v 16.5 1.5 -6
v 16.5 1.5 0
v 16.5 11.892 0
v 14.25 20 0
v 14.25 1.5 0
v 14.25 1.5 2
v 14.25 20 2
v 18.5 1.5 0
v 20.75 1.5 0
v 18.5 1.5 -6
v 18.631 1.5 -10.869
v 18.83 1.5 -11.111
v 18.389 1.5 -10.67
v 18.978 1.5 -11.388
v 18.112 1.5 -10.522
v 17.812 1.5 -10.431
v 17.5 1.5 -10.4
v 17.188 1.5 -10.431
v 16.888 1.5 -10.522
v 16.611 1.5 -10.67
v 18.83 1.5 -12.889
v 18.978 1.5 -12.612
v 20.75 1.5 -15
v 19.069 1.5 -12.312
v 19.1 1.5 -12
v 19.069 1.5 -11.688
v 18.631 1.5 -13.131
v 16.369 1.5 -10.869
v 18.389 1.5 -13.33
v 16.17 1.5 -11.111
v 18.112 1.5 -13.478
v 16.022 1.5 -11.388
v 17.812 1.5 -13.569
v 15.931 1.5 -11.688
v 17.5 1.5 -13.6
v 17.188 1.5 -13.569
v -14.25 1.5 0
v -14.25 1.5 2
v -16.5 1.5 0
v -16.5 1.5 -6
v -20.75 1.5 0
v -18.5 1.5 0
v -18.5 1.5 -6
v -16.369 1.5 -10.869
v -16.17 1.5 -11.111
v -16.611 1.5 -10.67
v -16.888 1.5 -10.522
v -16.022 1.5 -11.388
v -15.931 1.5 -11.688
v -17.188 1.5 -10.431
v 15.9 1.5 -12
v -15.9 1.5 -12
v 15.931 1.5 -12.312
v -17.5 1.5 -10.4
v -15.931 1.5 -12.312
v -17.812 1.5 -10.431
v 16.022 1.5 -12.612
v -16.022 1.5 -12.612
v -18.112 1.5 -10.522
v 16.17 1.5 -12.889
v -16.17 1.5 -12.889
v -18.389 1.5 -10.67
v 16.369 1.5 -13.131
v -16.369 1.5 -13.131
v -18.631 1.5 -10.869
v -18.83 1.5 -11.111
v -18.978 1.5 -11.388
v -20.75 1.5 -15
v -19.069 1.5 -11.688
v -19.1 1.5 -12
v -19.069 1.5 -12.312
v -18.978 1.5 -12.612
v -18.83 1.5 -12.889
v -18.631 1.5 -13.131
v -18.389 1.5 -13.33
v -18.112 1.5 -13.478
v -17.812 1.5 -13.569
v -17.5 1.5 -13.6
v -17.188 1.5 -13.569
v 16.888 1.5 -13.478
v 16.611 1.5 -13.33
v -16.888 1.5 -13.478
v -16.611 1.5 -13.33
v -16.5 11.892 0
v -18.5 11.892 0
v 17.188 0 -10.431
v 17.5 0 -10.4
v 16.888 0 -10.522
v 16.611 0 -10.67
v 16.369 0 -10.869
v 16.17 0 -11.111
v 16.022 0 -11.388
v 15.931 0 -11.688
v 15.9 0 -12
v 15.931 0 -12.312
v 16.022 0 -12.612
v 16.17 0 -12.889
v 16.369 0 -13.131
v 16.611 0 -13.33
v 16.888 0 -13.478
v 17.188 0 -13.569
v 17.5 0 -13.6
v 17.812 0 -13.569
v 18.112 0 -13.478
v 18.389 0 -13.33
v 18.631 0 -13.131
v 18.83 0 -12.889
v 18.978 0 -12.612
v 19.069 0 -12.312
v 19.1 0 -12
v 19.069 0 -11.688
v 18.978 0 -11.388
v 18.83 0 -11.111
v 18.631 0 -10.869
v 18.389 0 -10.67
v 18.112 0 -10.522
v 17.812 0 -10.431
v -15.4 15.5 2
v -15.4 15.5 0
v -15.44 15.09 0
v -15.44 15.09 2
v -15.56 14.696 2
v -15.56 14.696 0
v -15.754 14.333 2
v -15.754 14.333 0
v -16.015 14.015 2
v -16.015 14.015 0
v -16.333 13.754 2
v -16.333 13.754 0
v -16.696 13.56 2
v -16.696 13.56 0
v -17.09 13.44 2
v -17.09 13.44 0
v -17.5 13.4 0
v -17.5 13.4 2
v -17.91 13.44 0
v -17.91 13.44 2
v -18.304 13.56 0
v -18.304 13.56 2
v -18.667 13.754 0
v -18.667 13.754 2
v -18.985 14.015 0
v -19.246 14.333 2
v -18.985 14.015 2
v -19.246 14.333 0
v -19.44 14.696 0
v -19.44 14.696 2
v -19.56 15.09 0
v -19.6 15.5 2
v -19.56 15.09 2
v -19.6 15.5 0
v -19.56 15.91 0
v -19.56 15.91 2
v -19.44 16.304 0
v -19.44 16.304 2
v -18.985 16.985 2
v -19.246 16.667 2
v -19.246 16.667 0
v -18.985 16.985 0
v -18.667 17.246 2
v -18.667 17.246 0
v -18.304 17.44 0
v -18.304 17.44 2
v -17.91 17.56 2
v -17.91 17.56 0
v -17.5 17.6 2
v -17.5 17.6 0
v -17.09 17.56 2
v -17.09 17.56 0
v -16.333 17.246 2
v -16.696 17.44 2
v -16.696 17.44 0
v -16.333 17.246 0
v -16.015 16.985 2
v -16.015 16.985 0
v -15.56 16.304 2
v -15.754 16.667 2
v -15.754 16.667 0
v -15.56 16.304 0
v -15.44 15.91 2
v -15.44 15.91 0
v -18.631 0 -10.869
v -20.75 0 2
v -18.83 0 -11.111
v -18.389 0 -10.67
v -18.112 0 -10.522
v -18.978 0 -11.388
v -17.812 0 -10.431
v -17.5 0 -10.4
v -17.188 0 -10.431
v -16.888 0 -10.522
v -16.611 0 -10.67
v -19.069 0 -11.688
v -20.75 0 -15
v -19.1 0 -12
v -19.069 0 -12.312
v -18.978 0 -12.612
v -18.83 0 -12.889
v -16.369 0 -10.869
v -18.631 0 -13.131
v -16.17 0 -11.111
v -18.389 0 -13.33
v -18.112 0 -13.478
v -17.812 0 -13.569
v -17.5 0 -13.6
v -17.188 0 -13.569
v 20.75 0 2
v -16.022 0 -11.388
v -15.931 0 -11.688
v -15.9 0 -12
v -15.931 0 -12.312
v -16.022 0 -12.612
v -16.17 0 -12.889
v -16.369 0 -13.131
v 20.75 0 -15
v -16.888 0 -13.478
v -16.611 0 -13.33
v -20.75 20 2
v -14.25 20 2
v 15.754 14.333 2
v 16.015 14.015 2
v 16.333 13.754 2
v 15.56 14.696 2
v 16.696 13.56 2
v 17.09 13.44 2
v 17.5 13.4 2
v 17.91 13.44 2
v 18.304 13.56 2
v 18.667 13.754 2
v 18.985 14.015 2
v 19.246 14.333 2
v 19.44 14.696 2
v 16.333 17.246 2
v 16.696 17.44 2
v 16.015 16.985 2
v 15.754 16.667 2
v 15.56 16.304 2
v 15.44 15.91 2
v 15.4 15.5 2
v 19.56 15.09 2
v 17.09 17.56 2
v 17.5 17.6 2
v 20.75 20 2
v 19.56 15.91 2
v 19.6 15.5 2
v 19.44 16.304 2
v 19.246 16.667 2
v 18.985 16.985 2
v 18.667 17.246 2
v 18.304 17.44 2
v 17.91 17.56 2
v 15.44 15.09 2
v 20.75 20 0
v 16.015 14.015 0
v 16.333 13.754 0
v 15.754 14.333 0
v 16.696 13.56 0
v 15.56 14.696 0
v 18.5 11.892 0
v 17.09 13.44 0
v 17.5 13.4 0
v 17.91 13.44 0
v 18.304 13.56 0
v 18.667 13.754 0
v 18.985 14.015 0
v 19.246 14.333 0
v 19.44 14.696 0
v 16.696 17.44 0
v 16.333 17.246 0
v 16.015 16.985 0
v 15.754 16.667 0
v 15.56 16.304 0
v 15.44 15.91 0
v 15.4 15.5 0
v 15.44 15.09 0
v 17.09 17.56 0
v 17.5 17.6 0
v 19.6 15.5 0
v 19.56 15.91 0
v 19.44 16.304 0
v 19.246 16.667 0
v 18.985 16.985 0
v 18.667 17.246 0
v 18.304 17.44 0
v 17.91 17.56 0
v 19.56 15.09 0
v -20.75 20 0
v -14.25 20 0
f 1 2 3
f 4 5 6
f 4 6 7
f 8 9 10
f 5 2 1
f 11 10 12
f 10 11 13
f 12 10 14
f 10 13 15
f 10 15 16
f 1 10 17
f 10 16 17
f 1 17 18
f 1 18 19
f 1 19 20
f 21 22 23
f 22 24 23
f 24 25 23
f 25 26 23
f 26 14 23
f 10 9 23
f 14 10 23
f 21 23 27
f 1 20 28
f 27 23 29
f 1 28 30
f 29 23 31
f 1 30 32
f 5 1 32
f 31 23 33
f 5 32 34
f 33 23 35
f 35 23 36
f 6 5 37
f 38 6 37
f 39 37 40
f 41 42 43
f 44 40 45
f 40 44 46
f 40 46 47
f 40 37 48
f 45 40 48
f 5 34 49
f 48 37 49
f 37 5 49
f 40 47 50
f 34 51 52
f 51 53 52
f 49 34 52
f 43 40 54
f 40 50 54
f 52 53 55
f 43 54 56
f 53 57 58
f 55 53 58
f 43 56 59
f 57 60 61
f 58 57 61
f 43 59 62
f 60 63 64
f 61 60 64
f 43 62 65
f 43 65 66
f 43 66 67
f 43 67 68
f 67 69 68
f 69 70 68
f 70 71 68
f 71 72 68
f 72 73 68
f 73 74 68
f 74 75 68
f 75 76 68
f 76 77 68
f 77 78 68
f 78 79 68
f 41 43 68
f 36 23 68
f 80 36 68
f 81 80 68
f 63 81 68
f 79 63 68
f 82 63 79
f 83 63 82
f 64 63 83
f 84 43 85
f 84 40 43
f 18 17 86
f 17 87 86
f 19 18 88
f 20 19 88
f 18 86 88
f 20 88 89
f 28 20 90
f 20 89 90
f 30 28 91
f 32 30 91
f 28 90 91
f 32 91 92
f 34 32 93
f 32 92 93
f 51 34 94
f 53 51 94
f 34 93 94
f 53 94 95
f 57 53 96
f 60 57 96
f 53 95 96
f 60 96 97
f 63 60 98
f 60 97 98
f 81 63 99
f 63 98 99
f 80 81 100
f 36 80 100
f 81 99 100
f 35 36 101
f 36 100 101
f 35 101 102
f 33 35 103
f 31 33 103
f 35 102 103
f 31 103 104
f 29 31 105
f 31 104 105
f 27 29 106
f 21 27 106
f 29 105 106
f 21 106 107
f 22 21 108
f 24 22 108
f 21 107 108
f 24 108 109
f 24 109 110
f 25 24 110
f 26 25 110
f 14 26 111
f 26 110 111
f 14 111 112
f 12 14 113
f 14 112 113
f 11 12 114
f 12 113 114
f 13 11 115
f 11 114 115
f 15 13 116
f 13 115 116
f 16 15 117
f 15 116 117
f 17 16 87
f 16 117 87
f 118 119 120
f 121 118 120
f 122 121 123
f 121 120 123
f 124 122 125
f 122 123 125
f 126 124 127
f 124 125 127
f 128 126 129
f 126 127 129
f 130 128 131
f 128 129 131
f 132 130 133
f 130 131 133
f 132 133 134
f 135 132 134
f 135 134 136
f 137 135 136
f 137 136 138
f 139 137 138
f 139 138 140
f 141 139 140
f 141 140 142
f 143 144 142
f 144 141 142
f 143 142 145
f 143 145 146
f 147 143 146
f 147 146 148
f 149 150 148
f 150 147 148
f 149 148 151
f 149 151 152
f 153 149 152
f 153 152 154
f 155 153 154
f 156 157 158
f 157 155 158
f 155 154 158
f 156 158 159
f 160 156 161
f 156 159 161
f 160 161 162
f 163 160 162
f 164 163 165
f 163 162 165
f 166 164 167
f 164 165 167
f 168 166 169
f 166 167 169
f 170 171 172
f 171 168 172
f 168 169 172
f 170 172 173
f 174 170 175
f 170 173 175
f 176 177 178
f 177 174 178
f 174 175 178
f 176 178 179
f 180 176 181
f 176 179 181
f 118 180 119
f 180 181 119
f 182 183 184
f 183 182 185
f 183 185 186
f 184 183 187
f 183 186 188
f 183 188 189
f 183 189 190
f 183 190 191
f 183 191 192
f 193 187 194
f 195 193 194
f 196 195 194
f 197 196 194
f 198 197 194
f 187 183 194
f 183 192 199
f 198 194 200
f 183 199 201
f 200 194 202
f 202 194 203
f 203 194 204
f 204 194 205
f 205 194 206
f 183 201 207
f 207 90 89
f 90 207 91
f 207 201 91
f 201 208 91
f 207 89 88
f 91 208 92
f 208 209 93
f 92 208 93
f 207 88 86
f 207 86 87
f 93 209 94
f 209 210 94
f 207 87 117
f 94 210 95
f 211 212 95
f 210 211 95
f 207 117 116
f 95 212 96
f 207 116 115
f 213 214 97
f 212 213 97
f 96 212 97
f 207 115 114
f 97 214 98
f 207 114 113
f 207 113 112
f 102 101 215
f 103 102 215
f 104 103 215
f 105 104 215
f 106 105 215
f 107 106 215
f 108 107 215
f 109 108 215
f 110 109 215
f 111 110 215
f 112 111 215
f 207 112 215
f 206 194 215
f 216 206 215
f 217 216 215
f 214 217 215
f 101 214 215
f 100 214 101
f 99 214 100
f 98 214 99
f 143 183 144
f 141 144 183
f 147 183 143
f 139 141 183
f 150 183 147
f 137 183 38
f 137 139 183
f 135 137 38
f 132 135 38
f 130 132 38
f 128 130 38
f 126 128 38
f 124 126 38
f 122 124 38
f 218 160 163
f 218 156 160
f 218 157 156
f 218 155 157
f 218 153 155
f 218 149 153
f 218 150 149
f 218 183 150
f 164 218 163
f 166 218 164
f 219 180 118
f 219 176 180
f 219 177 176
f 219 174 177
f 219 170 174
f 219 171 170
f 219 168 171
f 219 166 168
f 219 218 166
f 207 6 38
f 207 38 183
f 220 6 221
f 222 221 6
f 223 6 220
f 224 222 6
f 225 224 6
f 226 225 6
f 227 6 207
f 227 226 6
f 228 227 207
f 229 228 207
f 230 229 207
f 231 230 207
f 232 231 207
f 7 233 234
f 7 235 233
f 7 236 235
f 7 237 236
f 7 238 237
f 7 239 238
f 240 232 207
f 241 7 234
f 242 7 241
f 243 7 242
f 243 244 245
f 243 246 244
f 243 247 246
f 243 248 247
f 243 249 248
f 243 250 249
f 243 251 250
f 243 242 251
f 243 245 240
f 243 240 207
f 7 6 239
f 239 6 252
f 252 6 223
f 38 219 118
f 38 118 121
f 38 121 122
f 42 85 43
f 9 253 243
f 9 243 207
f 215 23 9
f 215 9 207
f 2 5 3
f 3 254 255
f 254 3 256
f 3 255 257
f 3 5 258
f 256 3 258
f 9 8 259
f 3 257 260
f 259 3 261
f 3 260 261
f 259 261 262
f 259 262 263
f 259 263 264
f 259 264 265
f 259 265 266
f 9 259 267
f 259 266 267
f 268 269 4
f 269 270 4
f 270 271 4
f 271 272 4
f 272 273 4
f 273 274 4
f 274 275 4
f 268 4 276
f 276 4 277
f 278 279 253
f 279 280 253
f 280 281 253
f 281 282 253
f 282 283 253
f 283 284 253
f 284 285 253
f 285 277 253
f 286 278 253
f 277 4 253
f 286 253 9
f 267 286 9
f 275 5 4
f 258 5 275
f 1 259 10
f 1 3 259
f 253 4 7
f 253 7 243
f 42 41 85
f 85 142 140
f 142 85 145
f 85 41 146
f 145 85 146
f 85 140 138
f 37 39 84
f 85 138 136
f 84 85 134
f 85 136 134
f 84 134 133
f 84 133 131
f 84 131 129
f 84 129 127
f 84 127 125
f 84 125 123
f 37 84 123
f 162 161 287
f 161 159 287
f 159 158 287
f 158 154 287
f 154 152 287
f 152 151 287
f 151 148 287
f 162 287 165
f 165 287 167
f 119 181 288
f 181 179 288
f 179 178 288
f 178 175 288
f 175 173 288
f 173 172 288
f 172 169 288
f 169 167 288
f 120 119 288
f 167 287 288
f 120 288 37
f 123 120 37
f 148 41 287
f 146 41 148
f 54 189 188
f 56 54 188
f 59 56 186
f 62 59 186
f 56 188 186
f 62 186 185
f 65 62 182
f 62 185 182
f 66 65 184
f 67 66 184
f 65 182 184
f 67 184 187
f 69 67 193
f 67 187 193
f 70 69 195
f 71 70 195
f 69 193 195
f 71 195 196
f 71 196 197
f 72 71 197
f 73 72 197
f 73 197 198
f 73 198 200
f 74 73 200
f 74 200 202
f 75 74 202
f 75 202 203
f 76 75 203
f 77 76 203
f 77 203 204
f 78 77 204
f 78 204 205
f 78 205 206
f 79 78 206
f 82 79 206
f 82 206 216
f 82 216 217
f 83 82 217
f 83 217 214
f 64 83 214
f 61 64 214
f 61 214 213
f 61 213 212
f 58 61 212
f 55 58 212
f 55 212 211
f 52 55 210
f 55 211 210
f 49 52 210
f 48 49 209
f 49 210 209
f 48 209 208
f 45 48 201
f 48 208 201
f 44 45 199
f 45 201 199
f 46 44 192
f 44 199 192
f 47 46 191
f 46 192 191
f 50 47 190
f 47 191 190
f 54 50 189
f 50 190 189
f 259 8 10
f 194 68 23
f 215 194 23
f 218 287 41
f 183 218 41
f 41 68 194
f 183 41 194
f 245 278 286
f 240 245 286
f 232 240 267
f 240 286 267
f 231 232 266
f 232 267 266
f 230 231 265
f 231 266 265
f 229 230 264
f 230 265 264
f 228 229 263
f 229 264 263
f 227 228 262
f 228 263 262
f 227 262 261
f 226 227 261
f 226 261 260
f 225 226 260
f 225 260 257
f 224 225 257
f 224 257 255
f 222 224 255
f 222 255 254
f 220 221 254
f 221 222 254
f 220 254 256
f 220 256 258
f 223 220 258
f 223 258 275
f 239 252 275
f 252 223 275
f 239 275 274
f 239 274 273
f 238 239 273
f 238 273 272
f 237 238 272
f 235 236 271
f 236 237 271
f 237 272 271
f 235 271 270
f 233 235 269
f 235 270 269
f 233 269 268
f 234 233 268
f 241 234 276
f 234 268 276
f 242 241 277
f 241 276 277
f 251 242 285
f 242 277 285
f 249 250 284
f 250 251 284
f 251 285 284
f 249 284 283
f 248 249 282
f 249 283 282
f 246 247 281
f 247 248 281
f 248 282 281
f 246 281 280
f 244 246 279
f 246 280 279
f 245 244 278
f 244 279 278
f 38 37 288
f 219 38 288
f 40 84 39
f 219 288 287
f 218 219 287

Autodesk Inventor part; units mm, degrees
ref_plane "XZ Plane" through (0, 0, 0) normal (0, 1, 0) x (-1, 0, 0)
ref_plane "XY Plane" through (0, 0, 0) normal (0, 0, 1) x (1, 0, 0)
sketch "スケッチ1" plane through (0, 0, 0) normal (0, 0, 1) x (1, 0, 0)
  line L0 (0, 0) -> (0, 23.3181) construction
  line L1 (-22.6457, 15.5) -> (22.6457, 15.5) construction
  line L2 (-20.3832, 1.5) -> (20.3832, 1.5) construction
  circle A0 centre (0, 15.5) radius 14 construction
  line L3 (-22.6457, 7.5) -> (22.6457, 7.5) construction
  circle A1 centre (-17.5, 15.5) radius 2.1
  circle A2 centre (17.5, 15.5) radius 2.1
  line L4 (-14.25, 20) -> (-20.75, 20)
  line L5 (-20.75, 20) -> (-20.75, 0)
  line L6 (-20.75, 0) -> (-14.25, 0)
  line L7 (-14.25, 0) -> (-14.25, 20)
  line L8 (14.25, 20) -> (20.75, 20)
  line L9 (20.75, 20) -> (20.75, 0)
  line L10 (20.75, 0) -> (14.25, 0)
  line L11 (14.25, 0) -> (14.25, 20)
  line L12 (20.75, 0) -> (20.75, 1.5)
  line L13 (20.75, 1.5) -> (-20.75, 1.5)
  line L14 (-20.75, 1.5) -> (-20.75, 0)
  line L15 (-20.75, 0) -> (20.75, 0)
  point P0 (0, 1.5)
  point P1 (0, 7.5)
  point P2 (-17.5, 20)
  point P3 (17.5, 20)
  point P4 (-14.25, 0)
  point P5 (14.25, 0)
  point P6 (14.25, 1.5)
  point P7 (-14.25, 1.5)
  point P8 (-20.75, 1.5)
  dimension "d0" = 28
  dimension "d1" = 1.5
  dimension "d2" = 8
  dimension "d3" = 4.2
  dimension "d4" = 35
  dimension "d5" = 6.5
  dimension "d6" = 20
extrude "前" add sketch "スケッチ1" along normal blind 2
extrude "底" add sketch "スケッチ1" against normal blind 15 contours L13 L11 L15 L7 | L7 L6 L5 L13 | L13 L9 L10 L11
ref_plane "作業平面1" through (17.5, 0, 0) normal (1, 0, 0) x (0, 1, 0)
sketch "スケッチ2" plane through (17.5, 0, 0) normal (1, 0, 0) x (0, 1, 0)
  line L0 (11.8923, 0) -> (1.5, -6)
  line L1 (1.5, 0) -> (1.5, -15) projected
  line L2 (1.5, 0) -> (20, 0) projected
  line L3 (11.8923, 0) -> (1.5, 0)
  line L4 (1.5, 0) -> (1.5, -6)
  point P0 (0, 0)
  dimension "d12" = 60
  dimension "d13" = 6
extrude "リブ" add sketch "スケッチ2" along normal mid plane 2
mirror "ミラー1" about plane through (0, 0, 0) normal (1, 0, 0) of "リブ"
sketch "スケッチ3" plane through (-14.25, 1.5, 2) normal (0, 1, 0) x (1, 0, 0)
  line L0 (14.25, -18.7393) -> (14.25, 26.1406) construction
  line L1 (41.5884, 14) -> (-17.6431, 14) construction
  line L2 (35, 0) -> (28.5, 0) construction
  point P0 (14.25, 2)
  point P1 (31.75, 14)
  point P2 (-3.25, 14)
  dimension "d16" = 35
  dimension "d17" = 14
hole "穴1" at (17.5, 1.5, -12) at (-17.5, 1.5, -12) direction (0, -1, 0) diameter 3.2 end through all
properties part number "28BYJ-48_Braket"
